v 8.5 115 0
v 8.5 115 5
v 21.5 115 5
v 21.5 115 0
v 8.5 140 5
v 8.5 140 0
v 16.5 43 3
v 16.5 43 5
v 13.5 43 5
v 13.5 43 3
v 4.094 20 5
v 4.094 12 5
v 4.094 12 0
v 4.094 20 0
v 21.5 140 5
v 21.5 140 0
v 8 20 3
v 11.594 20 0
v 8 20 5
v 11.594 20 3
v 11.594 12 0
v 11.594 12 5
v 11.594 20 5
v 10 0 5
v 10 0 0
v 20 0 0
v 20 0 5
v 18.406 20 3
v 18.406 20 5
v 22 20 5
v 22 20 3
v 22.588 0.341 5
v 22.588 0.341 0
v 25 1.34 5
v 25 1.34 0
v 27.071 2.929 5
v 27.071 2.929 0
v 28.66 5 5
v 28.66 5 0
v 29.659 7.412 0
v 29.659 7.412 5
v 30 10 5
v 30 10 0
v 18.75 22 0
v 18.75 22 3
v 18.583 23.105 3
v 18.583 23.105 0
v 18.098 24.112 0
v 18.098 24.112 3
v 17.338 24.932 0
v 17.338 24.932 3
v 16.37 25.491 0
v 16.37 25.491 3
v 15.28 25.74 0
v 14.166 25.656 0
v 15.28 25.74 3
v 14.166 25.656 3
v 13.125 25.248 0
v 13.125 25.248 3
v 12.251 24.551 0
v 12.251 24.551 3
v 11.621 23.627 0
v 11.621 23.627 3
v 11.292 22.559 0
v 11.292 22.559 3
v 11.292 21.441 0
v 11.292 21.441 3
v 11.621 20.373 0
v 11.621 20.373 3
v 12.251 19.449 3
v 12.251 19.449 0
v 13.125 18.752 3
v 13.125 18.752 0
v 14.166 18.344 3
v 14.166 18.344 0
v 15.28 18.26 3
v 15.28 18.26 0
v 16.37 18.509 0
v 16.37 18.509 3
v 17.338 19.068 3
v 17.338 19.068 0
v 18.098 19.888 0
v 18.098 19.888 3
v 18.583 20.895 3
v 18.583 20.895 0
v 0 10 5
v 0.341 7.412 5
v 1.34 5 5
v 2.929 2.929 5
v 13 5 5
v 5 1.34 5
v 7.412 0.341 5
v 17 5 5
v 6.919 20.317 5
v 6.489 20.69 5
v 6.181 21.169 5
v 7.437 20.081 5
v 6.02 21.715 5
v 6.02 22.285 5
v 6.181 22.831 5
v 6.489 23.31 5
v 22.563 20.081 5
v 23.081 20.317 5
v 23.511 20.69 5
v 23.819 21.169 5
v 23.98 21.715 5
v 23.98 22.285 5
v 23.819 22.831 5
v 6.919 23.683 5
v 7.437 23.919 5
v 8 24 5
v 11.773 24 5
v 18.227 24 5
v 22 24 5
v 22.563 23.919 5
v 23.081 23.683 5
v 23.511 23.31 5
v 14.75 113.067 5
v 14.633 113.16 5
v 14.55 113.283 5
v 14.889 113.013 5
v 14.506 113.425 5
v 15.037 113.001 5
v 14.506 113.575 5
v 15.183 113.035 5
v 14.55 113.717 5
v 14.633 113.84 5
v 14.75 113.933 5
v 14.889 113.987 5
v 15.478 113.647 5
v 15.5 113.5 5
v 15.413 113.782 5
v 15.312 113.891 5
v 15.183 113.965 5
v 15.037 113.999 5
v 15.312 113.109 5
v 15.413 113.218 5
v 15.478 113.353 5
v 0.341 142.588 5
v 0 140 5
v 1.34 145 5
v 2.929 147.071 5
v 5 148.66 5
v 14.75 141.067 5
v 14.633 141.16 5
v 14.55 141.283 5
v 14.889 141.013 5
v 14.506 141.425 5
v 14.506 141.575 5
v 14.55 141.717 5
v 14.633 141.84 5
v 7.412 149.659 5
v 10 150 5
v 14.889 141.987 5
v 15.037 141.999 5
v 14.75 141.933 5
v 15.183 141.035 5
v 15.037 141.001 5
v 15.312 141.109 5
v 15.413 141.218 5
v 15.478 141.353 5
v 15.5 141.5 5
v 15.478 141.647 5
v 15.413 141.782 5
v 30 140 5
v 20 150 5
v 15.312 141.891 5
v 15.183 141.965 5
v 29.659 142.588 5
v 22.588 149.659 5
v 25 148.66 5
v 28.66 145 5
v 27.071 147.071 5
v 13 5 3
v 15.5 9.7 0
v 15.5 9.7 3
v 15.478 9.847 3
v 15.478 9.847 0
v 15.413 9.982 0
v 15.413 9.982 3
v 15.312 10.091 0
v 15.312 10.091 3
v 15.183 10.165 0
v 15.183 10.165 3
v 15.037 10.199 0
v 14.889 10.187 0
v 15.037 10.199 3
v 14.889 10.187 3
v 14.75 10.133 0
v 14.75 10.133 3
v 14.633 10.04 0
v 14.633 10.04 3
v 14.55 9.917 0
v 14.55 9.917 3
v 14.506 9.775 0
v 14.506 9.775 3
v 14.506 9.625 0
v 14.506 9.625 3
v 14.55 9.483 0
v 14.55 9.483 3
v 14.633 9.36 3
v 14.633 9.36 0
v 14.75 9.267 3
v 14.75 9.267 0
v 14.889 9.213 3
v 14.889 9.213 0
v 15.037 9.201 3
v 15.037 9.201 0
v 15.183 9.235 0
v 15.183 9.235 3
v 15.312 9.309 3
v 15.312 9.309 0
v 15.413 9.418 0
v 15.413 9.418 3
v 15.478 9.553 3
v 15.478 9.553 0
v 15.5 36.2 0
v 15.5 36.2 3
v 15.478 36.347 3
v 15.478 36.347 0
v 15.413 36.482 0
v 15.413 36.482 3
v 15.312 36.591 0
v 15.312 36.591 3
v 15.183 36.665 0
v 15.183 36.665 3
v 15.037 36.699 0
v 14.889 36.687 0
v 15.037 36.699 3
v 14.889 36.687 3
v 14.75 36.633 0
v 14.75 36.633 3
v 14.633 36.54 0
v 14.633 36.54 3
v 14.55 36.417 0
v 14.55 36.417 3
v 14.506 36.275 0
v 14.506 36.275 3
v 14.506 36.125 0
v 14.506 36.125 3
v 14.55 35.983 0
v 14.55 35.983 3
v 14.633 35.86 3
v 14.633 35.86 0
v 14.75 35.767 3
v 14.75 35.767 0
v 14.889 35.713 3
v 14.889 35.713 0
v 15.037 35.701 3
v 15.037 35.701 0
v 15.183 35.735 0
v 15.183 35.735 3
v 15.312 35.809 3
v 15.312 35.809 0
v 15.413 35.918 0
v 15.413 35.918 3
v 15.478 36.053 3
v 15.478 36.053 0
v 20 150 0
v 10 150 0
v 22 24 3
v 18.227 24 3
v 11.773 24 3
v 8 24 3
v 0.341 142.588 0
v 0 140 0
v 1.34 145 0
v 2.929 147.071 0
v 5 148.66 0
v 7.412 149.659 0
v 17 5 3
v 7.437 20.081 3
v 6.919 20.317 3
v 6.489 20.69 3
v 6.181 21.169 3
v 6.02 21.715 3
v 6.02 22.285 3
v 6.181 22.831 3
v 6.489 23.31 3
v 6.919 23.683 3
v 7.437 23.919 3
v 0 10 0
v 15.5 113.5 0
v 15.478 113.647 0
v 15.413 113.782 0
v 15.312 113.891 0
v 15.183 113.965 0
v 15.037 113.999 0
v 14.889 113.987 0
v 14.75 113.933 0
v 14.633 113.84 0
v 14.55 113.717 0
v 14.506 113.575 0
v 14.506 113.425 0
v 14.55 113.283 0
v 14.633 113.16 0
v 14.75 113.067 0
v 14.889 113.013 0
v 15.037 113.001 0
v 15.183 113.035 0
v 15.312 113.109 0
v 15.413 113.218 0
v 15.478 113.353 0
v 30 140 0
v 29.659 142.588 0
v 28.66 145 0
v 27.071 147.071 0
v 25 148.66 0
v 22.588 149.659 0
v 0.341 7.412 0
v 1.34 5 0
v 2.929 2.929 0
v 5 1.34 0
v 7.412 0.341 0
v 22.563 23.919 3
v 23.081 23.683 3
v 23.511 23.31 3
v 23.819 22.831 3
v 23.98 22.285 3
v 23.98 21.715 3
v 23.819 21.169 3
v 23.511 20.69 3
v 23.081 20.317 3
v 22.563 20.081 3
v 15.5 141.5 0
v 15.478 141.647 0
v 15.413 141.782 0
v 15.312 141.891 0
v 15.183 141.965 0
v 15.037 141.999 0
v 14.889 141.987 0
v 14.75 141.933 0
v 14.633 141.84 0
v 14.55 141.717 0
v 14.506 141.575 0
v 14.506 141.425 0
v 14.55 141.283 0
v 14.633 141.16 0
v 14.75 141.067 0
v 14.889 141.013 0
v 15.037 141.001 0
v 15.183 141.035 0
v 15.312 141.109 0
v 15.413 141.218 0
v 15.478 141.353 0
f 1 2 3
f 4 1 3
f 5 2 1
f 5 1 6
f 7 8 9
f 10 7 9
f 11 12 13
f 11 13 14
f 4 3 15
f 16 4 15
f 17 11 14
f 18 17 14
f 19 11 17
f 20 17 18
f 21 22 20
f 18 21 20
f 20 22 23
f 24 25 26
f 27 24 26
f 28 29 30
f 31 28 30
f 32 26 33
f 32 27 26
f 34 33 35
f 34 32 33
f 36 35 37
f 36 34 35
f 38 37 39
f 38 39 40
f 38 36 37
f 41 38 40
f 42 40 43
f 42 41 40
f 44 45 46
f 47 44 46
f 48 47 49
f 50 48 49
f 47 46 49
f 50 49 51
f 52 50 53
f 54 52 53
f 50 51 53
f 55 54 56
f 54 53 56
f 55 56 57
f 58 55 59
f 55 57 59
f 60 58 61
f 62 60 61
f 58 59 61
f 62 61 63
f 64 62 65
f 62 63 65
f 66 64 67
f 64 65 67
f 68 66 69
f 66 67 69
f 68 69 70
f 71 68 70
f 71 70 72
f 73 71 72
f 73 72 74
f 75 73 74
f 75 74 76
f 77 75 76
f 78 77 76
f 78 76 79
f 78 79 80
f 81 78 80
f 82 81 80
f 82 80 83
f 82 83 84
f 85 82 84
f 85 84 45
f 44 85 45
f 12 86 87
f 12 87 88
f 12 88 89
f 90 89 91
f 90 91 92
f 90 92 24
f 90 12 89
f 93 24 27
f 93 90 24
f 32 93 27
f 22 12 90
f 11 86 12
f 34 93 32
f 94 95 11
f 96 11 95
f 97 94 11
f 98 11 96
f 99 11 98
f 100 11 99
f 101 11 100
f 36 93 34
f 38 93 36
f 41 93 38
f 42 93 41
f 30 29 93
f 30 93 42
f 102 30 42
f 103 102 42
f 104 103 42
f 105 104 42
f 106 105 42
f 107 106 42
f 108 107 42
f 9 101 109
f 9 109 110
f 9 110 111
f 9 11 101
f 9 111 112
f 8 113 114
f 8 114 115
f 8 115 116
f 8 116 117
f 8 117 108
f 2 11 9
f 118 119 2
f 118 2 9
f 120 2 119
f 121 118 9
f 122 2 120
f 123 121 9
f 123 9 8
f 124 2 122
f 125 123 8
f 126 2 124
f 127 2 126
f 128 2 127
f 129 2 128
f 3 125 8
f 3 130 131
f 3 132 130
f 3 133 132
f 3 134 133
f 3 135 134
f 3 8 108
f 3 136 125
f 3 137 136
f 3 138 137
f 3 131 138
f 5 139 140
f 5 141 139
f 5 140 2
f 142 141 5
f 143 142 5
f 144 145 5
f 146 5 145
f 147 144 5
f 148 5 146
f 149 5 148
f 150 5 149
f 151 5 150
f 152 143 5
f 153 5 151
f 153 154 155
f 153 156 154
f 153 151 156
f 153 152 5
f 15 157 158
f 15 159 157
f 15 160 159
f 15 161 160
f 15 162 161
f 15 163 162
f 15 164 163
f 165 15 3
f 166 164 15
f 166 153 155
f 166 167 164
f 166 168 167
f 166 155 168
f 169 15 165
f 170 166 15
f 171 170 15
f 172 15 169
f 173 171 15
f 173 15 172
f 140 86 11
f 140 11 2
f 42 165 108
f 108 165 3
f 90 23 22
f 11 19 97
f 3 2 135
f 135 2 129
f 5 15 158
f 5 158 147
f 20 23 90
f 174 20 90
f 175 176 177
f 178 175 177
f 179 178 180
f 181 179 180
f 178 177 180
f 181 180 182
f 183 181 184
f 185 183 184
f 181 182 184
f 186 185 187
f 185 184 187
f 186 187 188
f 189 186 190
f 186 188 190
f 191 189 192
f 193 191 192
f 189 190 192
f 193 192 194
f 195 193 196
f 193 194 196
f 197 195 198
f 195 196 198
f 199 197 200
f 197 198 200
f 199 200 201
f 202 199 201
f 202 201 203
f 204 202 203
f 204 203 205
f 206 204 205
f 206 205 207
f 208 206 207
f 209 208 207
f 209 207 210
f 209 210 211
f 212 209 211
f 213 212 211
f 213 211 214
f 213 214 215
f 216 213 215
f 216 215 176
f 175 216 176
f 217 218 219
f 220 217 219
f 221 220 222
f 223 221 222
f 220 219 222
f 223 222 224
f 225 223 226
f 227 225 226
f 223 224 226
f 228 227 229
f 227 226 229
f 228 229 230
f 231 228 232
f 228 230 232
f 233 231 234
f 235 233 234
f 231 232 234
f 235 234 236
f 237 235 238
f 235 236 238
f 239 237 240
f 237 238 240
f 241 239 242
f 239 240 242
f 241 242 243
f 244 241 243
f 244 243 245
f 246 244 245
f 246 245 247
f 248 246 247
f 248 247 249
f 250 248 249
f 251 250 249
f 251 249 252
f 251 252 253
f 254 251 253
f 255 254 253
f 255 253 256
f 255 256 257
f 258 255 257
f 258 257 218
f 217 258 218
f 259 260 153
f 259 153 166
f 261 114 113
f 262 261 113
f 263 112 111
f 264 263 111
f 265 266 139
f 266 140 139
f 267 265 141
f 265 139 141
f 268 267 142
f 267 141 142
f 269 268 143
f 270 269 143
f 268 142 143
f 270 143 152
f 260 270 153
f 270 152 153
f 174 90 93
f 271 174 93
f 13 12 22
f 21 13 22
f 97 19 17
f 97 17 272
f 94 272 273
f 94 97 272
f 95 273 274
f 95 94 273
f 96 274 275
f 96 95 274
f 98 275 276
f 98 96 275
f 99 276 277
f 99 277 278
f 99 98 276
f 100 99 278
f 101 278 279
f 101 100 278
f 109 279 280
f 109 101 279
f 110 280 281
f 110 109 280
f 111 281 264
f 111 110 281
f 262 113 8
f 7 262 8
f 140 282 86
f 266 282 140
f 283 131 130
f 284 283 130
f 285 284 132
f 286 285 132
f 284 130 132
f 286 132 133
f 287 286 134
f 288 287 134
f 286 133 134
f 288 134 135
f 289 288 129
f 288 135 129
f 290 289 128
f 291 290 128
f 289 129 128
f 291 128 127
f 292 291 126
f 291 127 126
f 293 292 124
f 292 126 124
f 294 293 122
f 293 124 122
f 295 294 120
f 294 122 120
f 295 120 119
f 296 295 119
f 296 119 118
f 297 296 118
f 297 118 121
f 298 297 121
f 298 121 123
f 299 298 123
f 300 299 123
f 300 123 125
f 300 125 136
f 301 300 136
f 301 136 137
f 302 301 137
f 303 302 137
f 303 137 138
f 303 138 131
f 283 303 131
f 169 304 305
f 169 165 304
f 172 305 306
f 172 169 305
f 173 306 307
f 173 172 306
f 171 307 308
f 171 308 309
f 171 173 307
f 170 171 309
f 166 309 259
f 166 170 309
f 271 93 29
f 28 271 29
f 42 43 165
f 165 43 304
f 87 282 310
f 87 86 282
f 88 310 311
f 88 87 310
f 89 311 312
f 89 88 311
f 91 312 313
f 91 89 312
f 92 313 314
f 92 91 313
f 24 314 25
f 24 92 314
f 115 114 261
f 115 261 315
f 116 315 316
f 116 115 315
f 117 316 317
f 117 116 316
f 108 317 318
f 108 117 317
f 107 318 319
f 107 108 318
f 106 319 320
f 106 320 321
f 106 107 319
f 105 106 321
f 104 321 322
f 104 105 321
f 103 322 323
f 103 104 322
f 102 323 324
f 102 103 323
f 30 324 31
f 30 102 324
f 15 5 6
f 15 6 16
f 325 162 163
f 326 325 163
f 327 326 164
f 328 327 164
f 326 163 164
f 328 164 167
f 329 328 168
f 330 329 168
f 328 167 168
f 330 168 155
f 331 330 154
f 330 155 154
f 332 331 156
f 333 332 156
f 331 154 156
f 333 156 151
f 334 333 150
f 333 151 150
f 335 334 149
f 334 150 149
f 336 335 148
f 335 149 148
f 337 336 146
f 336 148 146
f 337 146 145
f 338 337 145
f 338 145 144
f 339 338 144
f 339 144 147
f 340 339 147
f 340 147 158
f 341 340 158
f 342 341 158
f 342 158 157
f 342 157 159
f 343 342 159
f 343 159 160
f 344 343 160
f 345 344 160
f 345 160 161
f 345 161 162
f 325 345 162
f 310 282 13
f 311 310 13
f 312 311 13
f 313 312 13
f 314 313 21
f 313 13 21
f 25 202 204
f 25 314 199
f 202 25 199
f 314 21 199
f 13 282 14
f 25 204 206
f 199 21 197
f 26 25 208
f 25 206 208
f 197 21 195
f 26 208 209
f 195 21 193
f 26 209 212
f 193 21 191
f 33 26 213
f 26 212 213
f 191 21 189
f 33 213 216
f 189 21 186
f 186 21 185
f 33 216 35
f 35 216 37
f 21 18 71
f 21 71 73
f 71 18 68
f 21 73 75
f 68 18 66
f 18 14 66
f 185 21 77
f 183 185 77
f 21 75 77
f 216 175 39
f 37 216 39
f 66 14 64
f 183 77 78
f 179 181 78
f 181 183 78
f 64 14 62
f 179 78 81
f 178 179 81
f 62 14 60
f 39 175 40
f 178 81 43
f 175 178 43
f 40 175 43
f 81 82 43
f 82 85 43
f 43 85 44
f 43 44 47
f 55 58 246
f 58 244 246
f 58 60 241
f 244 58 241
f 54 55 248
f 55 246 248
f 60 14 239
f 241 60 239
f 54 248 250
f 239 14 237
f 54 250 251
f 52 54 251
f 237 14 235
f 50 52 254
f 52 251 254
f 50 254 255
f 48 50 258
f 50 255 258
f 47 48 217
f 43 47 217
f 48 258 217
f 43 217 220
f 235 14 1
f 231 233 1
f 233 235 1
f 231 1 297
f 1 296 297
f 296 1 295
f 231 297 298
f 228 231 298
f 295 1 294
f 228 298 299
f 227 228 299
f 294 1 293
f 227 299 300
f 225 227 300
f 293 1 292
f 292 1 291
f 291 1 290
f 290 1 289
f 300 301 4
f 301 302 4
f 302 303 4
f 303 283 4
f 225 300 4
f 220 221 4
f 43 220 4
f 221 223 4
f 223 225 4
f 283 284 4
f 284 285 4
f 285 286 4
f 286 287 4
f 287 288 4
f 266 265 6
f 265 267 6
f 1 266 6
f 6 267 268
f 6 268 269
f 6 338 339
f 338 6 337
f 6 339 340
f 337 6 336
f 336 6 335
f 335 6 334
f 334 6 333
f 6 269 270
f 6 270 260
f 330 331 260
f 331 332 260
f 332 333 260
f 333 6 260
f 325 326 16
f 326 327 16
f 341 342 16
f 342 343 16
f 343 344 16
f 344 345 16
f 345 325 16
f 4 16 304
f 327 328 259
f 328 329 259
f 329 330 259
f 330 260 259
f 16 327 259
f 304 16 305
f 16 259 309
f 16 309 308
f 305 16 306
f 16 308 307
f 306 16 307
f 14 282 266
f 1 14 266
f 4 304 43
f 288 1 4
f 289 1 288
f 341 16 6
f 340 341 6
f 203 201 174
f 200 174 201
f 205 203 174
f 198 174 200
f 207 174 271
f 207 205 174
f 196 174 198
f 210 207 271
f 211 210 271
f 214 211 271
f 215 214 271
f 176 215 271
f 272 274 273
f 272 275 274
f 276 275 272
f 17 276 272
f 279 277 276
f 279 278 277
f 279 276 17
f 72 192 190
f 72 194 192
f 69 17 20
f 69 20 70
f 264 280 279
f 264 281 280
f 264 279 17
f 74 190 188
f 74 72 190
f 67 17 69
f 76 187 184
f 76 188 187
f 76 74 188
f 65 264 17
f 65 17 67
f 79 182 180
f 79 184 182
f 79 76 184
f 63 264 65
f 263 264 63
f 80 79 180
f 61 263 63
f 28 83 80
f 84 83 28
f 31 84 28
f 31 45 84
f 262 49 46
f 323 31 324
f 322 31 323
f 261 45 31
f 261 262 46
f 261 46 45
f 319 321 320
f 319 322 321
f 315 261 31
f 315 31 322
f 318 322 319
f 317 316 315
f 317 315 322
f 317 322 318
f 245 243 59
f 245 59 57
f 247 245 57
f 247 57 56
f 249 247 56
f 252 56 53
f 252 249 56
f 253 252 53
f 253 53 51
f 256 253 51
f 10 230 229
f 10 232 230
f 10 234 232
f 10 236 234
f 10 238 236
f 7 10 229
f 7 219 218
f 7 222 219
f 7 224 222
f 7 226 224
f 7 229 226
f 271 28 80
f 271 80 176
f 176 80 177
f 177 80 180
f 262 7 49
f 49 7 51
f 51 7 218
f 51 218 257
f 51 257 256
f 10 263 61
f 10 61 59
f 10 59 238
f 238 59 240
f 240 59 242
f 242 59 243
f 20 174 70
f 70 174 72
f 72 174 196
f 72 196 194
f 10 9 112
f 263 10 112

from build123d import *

# Parameters (mm, degrees)
SKICA1_W                 = 30
SKICA1_H                 = 150
P_IDAT_VYSUNUT_M1_DEPTH  = 5
ZAOBLIT1_R               = 10
SKICA2_W                 = 13
SKICA2_H                 = 25
ODEBRAT_VYSUNUT_M1_DEPTH = 6
SKICA3_R                 = 0.5
ODEBRAT_VYSUNUT_M2_DEPTH = 6
ODEBRAT_VYSUNUT_M3_DEPTH = 2
SKICA5_R                 = 0.5
ODEBRAT_VYSUNUT_M4_DEPTH = 4
SKICA6_R                 = 3.75
ODEBRAT_VYSUNUT_M5_DEPTH = 4
SKICA7_W                 = 7.5
SKICA7_H                 = 8
ODEBRAT_VYSUNUT_M6_DEPTH = 6


with BuildPart() as part:
    # Skica1 → Přidat vysunutím1 (new body)
    with BuildSketch(Plane.XY):
        with Locations((15, 75)):
            Rectangle(SKICA1_W, SKICA1_H)
    extrude(amount=P_IDAT_VYSUNUT_M1_DEPTH)

    # Zaoblit1
    zaoblit1_edges = [part.edges().sort_by_distance(p)[0] for p in [
        (0, 150, 2.5),
        (30, 150, 2.5),
        (30, 0, 2.5),
        (0, 0, 2.5),
    ]]
    fillet(zaoblit1_edges, radius=ZAOBLIT1_R)

    # Skica2 → Odebrat vysunutím1 (cut, through all)
    with BuildSketch(Plane.XY.offset(5)):
        with Locations((15, 127.5)):
            Rectangle(SKICA2_W, SKICA2_H)
    extrude(amount=-ODEBRAT_VYSUNUT_M1_DEPTH, mode=Mode.SUBTRACT)

    # Skica3 → Odebrat vysunutím2 (cut, through all)
    with BuildSketch(Plane.XY.offset(5)):
        with Locations((15, 141.5)):
            Circle(SKICA3_R)
        with Locations((15, 113.5)):
            Circle(SKICA3_R)
    extrude(amount=-ODEBRAT_VYSUNUT_M2_DEPTH, mode=Mode.SUBTRACT)

    # Skica4 → Odebrat vysunutím3 (cut)
    with BuildSketch(Plane.XY.offset(5)):
        Polygon((18.40625, 20), (11.59375, 20), (13, 5), (17, 5), align=None)
        Polygon((18.5, 21), (11.5, 21), (11.59375, 20), (18.40625, 20), align=None)
        Polygon((11.59375, 20), (11.5, 21), (11.772727273, 24), (8, 24), (8, 20), align=None)
        Polygon((11.772727273, 24), (11.5, 21), (18.5, 21), (18.227272727, 24), align=None)
        Polygon((18.227272727, 24), (18.5, 21), (18.40625, 20), (22, 20), (22, 24), align=None)
        with BuildLine():
            ThreePointArc((22, 24), (24, 22), (22, 20))
            Line((22, 20), (22, 24))
        make_face()
        with BuildLine():
            Line((8, 24), (8, 20))
            ThreePointArc((8, 20), (6, 22), (8, 24))
        make_face()
        Polygon((13.5, 43), (11.772727273, 24), (18.227272727, 24), (16.5, 43), align=None)
    extrude(amount=-ODEBRAT_VYSUNUT_M3_DEPTH, mode=Mode.SUBTRACT)

    # Skica5 → Odebrat vysunutím4 (cut, through all)
    with BuildSketch(Plane.XY.offset(3)):
        with Locations((15, 36.2)):
            Circle(SKICA5_R)
        with Locations((15, 9.7)):
            Circle(SKICA5_R)
    extrude(amount=-ODEBRAT_VYSUNUT_M4_DEPTH, mode=Mode.SUBTRACT)

    # Skica6 → Odebrat vysunutím5 (cut, through all)
    with BuildSketch(Plane.XY.offset(3)):
        with Locations((15, 22)):
            Circle(SKICA6_R)
    extrude(amount=-ODEBRAT_VYSUNUT_M5_DEPTH, mode=Mode.SUBTRACT)

    # Skica7 → Odebrat vysunutím6 (cut, through all)
    with BuildSketch(Plane.XY.offset(5)):
        with Locations((7.84375, 16)):
            Rectangle(SKICA7_W, SKICA7_H)
    extrude(amount=-ODEBRAT_VYSUNUT_M6_DEPTH, mode=Mode.SUBTRACT)


solid = part.part
